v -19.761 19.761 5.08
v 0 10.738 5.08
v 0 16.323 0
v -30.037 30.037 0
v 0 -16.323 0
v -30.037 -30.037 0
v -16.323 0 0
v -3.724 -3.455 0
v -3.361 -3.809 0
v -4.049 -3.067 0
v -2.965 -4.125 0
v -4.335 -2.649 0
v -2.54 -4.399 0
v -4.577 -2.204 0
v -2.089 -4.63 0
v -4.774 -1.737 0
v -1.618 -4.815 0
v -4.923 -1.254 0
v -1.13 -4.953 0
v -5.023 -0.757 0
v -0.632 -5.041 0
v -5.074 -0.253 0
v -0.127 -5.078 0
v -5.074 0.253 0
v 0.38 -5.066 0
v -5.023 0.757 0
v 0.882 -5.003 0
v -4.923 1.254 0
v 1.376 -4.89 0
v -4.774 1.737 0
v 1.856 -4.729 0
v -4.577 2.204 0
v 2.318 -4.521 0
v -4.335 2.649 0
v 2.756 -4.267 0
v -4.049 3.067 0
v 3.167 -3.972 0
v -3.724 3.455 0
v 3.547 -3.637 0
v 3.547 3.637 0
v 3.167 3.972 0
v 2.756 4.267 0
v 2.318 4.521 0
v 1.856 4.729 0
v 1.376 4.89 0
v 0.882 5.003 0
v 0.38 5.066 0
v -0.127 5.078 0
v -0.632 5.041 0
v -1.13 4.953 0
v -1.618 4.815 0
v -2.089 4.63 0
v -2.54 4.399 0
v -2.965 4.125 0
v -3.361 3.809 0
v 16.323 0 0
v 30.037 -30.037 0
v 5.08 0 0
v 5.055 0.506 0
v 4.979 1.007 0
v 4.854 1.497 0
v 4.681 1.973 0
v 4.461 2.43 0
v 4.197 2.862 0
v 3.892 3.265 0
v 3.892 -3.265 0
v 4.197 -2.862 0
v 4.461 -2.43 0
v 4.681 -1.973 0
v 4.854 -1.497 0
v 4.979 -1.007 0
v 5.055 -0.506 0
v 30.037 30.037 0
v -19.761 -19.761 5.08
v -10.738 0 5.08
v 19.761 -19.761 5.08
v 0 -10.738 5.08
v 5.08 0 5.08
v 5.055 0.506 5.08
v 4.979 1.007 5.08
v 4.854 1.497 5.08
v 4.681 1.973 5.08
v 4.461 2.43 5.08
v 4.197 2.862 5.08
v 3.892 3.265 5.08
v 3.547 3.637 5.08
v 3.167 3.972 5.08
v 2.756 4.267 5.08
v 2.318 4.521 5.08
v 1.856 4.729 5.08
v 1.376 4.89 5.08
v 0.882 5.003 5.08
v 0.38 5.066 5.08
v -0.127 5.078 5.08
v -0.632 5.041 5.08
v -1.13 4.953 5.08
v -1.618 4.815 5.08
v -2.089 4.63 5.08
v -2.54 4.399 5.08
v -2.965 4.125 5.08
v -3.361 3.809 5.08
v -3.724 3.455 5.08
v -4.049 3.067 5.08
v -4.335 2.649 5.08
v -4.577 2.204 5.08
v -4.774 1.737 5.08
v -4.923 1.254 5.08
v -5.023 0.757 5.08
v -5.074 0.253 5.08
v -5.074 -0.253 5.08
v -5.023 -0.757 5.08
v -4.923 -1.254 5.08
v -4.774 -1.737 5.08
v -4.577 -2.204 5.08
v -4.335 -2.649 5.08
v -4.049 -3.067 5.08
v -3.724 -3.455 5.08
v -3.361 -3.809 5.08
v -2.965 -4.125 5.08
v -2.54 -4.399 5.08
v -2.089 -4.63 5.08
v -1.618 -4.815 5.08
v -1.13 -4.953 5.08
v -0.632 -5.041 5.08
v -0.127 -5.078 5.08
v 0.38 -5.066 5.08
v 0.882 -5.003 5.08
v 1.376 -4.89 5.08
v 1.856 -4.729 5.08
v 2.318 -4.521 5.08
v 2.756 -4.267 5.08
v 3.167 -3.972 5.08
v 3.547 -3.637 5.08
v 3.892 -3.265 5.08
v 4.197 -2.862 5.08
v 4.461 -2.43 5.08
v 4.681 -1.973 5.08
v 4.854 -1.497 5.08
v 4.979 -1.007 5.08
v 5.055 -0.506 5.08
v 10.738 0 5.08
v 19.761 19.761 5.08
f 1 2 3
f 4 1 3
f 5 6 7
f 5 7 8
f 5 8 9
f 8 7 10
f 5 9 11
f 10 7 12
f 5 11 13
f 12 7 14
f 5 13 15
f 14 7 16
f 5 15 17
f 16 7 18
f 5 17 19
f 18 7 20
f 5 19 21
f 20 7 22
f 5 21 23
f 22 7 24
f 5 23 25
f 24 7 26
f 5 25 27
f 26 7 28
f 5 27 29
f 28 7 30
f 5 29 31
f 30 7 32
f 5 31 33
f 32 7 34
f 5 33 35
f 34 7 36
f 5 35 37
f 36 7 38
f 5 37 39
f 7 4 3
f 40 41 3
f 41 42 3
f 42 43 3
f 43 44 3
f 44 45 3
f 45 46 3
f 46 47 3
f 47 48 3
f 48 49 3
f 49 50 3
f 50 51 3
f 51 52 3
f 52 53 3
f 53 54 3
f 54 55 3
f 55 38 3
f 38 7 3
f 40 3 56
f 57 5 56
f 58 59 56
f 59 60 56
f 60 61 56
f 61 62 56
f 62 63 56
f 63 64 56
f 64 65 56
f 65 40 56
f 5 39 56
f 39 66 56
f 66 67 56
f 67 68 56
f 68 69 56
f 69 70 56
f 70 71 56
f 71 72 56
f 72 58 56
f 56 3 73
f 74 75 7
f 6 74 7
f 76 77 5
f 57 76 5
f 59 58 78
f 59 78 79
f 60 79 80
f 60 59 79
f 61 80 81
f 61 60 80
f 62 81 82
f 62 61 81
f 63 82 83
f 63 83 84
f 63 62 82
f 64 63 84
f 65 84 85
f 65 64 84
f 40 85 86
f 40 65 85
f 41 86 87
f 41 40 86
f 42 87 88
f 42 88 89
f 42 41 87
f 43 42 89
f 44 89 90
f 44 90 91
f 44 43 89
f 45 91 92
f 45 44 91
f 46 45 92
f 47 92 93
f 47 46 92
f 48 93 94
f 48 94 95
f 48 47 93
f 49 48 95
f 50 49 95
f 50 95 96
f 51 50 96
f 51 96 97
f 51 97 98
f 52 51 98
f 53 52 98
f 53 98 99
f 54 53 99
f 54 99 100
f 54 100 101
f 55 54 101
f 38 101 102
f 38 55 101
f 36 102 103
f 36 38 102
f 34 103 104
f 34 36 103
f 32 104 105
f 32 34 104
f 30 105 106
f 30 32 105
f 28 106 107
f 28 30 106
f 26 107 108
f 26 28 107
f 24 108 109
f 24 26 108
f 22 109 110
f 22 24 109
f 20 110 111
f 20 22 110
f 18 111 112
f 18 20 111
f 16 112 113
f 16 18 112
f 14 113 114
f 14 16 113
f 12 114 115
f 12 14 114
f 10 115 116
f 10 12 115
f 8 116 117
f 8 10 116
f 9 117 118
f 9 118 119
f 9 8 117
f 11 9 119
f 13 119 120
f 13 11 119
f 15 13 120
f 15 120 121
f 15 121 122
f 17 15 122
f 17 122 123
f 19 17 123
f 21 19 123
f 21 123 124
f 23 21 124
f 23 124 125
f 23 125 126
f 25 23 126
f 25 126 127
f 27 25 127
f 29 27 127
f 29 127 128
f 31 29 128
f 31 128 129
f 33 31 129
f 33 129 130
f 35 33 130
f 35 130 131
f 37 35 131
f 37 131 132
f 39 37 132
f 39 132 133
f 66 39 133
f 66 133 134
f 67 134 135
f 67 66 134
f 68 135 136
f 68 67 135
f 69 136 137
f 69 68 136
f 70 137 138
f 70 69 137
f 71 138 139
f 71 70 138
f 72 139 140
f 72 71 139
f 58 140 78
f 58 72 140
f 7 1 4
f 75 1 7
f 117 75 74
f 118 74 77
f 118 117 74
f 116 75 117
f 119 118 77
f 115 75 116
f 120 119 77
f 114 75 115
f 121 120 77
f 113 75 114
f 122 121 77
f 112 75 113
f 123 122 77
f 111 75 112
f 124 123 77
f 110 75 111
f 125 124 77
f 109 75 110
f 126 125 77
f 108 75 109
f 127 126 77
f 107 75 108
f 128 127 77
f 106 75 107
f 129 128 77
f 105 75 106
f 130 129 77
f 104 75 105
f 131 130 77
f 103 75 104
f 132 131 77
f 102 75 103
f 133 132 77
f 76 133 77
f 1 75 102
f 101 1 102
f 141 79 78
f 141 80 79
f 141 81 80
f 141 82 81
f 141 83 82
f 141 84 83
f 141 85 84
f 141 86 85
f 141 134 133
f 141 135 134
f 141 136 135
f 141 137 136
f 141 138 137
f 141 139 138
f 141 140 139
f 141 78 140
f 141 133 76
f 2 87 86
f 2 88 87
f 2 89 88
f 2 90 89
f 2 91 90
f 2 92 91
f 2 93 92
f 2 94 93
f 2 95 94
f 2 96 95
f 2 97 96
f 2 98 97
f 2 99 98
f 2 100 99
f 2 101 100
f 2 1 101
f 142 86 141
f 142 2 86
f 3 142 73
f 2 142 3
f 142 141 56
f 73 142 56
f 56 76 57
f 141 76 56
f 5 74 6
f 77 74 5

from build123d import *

# Parameters (mm, degrees)
F0_R     = 5.08
F1_DEPTH = 5.08
F2_SIZE  = 5.07999


# Not quite as in the source:
# - a fillet or chamfer is up to 0.001 mm smaller than in the source, because OpenCascade refuses the exact size


with BuildPart() as f1:
    # F0 (on Top) → F1 (new body)
    with BuildSketch(Plane.XY):
        with BuildLine():
            ThreePointArc((-16.3226491362, 0), (-11.5418558911, 11.5418558911), (0, 16.3226491362))
            Line((0, 16.3226491362), (-30.0371784096, 30.0371784096))
            Line((-30.0371784096, 30.0371784096), (-16.3226491362, 0))
        make_face()
        with BuildLine():
            ThreePointArc((0, 16.3226491362), (11.5418558911, 11.5418558911), (16.3226491362, 0))
            Line((16.3226491362, 0), (30.0371784096, 30.0371784096))
            Line((30.0371784096, 30.0371784096), (0, 16.3226491362))
        make_face()
        with BuildLine():
            Line((30.0371784096, -30.0371784096), (16.3226491362, 0))
            ThreePointArc((16.3226491362, 0), (11.5418558911, -11.5418558911), (0, -16.3226491362))
            Line((0, -16.3226491362), (30.0371784096, -30.0371784096))
        make_face()
        with BuildLine():
            Line((-30.0371784096, -30.0371784096), (0, -16.3226491362))
            ThreePointArc((0, -16.3226491362), (-11.5418558911, -11.5418558911), (-16.3226491362, 0))
            Line((-16.3226491362, 0), (-30.0371784096, -30.0371784096))
        make_face()
        with BuildLine():
            ThreePointArc((0, -16.3226491362), (11.5418558911, -11.5418558911), (16.3226491362, 0))
            ThreePointArc((16.3226491362, 0), (11.5418558911, 11.5418558911), (0, 16.3226491362))
            ThreePointArc((0, 16.3226491362), (-11.5418558911, 11.5418558911), (-16.3226491362, 0))
            ThreePointArc((-16.3226491362, 0), (-11.5418558911, -11.5418558911), (0, -16.3226491362))
        make_face()
        Circle(F0_R, mode=Mode.SUBTRACT)
    extrude(amount=F1_DEPTH)

    # F2 (size 5.08 in the source; OpenCascade refuses exactly that, so slightly less here)
    f2_edges = [f1.edges().sort_by_distance(p)[0] for p in [
        (-15.018589, -23.179914, 5.08),
        (-23.179914, -15.018589, 5.08),
        (15.018589, -23.179914, 5.08),
        (23.179914, -15.018589, 5.08),
        (23.179914, 15.018589, 5.08),
        (15.018589, 23.179914, 5.08),
        (-15.018589, 23.179914, 5.08),
        (-23.179914, 15.018589, 5.08),
    ]]
    chamfer(f2_edges, length=F2_SIZE)


solid = f1.part
